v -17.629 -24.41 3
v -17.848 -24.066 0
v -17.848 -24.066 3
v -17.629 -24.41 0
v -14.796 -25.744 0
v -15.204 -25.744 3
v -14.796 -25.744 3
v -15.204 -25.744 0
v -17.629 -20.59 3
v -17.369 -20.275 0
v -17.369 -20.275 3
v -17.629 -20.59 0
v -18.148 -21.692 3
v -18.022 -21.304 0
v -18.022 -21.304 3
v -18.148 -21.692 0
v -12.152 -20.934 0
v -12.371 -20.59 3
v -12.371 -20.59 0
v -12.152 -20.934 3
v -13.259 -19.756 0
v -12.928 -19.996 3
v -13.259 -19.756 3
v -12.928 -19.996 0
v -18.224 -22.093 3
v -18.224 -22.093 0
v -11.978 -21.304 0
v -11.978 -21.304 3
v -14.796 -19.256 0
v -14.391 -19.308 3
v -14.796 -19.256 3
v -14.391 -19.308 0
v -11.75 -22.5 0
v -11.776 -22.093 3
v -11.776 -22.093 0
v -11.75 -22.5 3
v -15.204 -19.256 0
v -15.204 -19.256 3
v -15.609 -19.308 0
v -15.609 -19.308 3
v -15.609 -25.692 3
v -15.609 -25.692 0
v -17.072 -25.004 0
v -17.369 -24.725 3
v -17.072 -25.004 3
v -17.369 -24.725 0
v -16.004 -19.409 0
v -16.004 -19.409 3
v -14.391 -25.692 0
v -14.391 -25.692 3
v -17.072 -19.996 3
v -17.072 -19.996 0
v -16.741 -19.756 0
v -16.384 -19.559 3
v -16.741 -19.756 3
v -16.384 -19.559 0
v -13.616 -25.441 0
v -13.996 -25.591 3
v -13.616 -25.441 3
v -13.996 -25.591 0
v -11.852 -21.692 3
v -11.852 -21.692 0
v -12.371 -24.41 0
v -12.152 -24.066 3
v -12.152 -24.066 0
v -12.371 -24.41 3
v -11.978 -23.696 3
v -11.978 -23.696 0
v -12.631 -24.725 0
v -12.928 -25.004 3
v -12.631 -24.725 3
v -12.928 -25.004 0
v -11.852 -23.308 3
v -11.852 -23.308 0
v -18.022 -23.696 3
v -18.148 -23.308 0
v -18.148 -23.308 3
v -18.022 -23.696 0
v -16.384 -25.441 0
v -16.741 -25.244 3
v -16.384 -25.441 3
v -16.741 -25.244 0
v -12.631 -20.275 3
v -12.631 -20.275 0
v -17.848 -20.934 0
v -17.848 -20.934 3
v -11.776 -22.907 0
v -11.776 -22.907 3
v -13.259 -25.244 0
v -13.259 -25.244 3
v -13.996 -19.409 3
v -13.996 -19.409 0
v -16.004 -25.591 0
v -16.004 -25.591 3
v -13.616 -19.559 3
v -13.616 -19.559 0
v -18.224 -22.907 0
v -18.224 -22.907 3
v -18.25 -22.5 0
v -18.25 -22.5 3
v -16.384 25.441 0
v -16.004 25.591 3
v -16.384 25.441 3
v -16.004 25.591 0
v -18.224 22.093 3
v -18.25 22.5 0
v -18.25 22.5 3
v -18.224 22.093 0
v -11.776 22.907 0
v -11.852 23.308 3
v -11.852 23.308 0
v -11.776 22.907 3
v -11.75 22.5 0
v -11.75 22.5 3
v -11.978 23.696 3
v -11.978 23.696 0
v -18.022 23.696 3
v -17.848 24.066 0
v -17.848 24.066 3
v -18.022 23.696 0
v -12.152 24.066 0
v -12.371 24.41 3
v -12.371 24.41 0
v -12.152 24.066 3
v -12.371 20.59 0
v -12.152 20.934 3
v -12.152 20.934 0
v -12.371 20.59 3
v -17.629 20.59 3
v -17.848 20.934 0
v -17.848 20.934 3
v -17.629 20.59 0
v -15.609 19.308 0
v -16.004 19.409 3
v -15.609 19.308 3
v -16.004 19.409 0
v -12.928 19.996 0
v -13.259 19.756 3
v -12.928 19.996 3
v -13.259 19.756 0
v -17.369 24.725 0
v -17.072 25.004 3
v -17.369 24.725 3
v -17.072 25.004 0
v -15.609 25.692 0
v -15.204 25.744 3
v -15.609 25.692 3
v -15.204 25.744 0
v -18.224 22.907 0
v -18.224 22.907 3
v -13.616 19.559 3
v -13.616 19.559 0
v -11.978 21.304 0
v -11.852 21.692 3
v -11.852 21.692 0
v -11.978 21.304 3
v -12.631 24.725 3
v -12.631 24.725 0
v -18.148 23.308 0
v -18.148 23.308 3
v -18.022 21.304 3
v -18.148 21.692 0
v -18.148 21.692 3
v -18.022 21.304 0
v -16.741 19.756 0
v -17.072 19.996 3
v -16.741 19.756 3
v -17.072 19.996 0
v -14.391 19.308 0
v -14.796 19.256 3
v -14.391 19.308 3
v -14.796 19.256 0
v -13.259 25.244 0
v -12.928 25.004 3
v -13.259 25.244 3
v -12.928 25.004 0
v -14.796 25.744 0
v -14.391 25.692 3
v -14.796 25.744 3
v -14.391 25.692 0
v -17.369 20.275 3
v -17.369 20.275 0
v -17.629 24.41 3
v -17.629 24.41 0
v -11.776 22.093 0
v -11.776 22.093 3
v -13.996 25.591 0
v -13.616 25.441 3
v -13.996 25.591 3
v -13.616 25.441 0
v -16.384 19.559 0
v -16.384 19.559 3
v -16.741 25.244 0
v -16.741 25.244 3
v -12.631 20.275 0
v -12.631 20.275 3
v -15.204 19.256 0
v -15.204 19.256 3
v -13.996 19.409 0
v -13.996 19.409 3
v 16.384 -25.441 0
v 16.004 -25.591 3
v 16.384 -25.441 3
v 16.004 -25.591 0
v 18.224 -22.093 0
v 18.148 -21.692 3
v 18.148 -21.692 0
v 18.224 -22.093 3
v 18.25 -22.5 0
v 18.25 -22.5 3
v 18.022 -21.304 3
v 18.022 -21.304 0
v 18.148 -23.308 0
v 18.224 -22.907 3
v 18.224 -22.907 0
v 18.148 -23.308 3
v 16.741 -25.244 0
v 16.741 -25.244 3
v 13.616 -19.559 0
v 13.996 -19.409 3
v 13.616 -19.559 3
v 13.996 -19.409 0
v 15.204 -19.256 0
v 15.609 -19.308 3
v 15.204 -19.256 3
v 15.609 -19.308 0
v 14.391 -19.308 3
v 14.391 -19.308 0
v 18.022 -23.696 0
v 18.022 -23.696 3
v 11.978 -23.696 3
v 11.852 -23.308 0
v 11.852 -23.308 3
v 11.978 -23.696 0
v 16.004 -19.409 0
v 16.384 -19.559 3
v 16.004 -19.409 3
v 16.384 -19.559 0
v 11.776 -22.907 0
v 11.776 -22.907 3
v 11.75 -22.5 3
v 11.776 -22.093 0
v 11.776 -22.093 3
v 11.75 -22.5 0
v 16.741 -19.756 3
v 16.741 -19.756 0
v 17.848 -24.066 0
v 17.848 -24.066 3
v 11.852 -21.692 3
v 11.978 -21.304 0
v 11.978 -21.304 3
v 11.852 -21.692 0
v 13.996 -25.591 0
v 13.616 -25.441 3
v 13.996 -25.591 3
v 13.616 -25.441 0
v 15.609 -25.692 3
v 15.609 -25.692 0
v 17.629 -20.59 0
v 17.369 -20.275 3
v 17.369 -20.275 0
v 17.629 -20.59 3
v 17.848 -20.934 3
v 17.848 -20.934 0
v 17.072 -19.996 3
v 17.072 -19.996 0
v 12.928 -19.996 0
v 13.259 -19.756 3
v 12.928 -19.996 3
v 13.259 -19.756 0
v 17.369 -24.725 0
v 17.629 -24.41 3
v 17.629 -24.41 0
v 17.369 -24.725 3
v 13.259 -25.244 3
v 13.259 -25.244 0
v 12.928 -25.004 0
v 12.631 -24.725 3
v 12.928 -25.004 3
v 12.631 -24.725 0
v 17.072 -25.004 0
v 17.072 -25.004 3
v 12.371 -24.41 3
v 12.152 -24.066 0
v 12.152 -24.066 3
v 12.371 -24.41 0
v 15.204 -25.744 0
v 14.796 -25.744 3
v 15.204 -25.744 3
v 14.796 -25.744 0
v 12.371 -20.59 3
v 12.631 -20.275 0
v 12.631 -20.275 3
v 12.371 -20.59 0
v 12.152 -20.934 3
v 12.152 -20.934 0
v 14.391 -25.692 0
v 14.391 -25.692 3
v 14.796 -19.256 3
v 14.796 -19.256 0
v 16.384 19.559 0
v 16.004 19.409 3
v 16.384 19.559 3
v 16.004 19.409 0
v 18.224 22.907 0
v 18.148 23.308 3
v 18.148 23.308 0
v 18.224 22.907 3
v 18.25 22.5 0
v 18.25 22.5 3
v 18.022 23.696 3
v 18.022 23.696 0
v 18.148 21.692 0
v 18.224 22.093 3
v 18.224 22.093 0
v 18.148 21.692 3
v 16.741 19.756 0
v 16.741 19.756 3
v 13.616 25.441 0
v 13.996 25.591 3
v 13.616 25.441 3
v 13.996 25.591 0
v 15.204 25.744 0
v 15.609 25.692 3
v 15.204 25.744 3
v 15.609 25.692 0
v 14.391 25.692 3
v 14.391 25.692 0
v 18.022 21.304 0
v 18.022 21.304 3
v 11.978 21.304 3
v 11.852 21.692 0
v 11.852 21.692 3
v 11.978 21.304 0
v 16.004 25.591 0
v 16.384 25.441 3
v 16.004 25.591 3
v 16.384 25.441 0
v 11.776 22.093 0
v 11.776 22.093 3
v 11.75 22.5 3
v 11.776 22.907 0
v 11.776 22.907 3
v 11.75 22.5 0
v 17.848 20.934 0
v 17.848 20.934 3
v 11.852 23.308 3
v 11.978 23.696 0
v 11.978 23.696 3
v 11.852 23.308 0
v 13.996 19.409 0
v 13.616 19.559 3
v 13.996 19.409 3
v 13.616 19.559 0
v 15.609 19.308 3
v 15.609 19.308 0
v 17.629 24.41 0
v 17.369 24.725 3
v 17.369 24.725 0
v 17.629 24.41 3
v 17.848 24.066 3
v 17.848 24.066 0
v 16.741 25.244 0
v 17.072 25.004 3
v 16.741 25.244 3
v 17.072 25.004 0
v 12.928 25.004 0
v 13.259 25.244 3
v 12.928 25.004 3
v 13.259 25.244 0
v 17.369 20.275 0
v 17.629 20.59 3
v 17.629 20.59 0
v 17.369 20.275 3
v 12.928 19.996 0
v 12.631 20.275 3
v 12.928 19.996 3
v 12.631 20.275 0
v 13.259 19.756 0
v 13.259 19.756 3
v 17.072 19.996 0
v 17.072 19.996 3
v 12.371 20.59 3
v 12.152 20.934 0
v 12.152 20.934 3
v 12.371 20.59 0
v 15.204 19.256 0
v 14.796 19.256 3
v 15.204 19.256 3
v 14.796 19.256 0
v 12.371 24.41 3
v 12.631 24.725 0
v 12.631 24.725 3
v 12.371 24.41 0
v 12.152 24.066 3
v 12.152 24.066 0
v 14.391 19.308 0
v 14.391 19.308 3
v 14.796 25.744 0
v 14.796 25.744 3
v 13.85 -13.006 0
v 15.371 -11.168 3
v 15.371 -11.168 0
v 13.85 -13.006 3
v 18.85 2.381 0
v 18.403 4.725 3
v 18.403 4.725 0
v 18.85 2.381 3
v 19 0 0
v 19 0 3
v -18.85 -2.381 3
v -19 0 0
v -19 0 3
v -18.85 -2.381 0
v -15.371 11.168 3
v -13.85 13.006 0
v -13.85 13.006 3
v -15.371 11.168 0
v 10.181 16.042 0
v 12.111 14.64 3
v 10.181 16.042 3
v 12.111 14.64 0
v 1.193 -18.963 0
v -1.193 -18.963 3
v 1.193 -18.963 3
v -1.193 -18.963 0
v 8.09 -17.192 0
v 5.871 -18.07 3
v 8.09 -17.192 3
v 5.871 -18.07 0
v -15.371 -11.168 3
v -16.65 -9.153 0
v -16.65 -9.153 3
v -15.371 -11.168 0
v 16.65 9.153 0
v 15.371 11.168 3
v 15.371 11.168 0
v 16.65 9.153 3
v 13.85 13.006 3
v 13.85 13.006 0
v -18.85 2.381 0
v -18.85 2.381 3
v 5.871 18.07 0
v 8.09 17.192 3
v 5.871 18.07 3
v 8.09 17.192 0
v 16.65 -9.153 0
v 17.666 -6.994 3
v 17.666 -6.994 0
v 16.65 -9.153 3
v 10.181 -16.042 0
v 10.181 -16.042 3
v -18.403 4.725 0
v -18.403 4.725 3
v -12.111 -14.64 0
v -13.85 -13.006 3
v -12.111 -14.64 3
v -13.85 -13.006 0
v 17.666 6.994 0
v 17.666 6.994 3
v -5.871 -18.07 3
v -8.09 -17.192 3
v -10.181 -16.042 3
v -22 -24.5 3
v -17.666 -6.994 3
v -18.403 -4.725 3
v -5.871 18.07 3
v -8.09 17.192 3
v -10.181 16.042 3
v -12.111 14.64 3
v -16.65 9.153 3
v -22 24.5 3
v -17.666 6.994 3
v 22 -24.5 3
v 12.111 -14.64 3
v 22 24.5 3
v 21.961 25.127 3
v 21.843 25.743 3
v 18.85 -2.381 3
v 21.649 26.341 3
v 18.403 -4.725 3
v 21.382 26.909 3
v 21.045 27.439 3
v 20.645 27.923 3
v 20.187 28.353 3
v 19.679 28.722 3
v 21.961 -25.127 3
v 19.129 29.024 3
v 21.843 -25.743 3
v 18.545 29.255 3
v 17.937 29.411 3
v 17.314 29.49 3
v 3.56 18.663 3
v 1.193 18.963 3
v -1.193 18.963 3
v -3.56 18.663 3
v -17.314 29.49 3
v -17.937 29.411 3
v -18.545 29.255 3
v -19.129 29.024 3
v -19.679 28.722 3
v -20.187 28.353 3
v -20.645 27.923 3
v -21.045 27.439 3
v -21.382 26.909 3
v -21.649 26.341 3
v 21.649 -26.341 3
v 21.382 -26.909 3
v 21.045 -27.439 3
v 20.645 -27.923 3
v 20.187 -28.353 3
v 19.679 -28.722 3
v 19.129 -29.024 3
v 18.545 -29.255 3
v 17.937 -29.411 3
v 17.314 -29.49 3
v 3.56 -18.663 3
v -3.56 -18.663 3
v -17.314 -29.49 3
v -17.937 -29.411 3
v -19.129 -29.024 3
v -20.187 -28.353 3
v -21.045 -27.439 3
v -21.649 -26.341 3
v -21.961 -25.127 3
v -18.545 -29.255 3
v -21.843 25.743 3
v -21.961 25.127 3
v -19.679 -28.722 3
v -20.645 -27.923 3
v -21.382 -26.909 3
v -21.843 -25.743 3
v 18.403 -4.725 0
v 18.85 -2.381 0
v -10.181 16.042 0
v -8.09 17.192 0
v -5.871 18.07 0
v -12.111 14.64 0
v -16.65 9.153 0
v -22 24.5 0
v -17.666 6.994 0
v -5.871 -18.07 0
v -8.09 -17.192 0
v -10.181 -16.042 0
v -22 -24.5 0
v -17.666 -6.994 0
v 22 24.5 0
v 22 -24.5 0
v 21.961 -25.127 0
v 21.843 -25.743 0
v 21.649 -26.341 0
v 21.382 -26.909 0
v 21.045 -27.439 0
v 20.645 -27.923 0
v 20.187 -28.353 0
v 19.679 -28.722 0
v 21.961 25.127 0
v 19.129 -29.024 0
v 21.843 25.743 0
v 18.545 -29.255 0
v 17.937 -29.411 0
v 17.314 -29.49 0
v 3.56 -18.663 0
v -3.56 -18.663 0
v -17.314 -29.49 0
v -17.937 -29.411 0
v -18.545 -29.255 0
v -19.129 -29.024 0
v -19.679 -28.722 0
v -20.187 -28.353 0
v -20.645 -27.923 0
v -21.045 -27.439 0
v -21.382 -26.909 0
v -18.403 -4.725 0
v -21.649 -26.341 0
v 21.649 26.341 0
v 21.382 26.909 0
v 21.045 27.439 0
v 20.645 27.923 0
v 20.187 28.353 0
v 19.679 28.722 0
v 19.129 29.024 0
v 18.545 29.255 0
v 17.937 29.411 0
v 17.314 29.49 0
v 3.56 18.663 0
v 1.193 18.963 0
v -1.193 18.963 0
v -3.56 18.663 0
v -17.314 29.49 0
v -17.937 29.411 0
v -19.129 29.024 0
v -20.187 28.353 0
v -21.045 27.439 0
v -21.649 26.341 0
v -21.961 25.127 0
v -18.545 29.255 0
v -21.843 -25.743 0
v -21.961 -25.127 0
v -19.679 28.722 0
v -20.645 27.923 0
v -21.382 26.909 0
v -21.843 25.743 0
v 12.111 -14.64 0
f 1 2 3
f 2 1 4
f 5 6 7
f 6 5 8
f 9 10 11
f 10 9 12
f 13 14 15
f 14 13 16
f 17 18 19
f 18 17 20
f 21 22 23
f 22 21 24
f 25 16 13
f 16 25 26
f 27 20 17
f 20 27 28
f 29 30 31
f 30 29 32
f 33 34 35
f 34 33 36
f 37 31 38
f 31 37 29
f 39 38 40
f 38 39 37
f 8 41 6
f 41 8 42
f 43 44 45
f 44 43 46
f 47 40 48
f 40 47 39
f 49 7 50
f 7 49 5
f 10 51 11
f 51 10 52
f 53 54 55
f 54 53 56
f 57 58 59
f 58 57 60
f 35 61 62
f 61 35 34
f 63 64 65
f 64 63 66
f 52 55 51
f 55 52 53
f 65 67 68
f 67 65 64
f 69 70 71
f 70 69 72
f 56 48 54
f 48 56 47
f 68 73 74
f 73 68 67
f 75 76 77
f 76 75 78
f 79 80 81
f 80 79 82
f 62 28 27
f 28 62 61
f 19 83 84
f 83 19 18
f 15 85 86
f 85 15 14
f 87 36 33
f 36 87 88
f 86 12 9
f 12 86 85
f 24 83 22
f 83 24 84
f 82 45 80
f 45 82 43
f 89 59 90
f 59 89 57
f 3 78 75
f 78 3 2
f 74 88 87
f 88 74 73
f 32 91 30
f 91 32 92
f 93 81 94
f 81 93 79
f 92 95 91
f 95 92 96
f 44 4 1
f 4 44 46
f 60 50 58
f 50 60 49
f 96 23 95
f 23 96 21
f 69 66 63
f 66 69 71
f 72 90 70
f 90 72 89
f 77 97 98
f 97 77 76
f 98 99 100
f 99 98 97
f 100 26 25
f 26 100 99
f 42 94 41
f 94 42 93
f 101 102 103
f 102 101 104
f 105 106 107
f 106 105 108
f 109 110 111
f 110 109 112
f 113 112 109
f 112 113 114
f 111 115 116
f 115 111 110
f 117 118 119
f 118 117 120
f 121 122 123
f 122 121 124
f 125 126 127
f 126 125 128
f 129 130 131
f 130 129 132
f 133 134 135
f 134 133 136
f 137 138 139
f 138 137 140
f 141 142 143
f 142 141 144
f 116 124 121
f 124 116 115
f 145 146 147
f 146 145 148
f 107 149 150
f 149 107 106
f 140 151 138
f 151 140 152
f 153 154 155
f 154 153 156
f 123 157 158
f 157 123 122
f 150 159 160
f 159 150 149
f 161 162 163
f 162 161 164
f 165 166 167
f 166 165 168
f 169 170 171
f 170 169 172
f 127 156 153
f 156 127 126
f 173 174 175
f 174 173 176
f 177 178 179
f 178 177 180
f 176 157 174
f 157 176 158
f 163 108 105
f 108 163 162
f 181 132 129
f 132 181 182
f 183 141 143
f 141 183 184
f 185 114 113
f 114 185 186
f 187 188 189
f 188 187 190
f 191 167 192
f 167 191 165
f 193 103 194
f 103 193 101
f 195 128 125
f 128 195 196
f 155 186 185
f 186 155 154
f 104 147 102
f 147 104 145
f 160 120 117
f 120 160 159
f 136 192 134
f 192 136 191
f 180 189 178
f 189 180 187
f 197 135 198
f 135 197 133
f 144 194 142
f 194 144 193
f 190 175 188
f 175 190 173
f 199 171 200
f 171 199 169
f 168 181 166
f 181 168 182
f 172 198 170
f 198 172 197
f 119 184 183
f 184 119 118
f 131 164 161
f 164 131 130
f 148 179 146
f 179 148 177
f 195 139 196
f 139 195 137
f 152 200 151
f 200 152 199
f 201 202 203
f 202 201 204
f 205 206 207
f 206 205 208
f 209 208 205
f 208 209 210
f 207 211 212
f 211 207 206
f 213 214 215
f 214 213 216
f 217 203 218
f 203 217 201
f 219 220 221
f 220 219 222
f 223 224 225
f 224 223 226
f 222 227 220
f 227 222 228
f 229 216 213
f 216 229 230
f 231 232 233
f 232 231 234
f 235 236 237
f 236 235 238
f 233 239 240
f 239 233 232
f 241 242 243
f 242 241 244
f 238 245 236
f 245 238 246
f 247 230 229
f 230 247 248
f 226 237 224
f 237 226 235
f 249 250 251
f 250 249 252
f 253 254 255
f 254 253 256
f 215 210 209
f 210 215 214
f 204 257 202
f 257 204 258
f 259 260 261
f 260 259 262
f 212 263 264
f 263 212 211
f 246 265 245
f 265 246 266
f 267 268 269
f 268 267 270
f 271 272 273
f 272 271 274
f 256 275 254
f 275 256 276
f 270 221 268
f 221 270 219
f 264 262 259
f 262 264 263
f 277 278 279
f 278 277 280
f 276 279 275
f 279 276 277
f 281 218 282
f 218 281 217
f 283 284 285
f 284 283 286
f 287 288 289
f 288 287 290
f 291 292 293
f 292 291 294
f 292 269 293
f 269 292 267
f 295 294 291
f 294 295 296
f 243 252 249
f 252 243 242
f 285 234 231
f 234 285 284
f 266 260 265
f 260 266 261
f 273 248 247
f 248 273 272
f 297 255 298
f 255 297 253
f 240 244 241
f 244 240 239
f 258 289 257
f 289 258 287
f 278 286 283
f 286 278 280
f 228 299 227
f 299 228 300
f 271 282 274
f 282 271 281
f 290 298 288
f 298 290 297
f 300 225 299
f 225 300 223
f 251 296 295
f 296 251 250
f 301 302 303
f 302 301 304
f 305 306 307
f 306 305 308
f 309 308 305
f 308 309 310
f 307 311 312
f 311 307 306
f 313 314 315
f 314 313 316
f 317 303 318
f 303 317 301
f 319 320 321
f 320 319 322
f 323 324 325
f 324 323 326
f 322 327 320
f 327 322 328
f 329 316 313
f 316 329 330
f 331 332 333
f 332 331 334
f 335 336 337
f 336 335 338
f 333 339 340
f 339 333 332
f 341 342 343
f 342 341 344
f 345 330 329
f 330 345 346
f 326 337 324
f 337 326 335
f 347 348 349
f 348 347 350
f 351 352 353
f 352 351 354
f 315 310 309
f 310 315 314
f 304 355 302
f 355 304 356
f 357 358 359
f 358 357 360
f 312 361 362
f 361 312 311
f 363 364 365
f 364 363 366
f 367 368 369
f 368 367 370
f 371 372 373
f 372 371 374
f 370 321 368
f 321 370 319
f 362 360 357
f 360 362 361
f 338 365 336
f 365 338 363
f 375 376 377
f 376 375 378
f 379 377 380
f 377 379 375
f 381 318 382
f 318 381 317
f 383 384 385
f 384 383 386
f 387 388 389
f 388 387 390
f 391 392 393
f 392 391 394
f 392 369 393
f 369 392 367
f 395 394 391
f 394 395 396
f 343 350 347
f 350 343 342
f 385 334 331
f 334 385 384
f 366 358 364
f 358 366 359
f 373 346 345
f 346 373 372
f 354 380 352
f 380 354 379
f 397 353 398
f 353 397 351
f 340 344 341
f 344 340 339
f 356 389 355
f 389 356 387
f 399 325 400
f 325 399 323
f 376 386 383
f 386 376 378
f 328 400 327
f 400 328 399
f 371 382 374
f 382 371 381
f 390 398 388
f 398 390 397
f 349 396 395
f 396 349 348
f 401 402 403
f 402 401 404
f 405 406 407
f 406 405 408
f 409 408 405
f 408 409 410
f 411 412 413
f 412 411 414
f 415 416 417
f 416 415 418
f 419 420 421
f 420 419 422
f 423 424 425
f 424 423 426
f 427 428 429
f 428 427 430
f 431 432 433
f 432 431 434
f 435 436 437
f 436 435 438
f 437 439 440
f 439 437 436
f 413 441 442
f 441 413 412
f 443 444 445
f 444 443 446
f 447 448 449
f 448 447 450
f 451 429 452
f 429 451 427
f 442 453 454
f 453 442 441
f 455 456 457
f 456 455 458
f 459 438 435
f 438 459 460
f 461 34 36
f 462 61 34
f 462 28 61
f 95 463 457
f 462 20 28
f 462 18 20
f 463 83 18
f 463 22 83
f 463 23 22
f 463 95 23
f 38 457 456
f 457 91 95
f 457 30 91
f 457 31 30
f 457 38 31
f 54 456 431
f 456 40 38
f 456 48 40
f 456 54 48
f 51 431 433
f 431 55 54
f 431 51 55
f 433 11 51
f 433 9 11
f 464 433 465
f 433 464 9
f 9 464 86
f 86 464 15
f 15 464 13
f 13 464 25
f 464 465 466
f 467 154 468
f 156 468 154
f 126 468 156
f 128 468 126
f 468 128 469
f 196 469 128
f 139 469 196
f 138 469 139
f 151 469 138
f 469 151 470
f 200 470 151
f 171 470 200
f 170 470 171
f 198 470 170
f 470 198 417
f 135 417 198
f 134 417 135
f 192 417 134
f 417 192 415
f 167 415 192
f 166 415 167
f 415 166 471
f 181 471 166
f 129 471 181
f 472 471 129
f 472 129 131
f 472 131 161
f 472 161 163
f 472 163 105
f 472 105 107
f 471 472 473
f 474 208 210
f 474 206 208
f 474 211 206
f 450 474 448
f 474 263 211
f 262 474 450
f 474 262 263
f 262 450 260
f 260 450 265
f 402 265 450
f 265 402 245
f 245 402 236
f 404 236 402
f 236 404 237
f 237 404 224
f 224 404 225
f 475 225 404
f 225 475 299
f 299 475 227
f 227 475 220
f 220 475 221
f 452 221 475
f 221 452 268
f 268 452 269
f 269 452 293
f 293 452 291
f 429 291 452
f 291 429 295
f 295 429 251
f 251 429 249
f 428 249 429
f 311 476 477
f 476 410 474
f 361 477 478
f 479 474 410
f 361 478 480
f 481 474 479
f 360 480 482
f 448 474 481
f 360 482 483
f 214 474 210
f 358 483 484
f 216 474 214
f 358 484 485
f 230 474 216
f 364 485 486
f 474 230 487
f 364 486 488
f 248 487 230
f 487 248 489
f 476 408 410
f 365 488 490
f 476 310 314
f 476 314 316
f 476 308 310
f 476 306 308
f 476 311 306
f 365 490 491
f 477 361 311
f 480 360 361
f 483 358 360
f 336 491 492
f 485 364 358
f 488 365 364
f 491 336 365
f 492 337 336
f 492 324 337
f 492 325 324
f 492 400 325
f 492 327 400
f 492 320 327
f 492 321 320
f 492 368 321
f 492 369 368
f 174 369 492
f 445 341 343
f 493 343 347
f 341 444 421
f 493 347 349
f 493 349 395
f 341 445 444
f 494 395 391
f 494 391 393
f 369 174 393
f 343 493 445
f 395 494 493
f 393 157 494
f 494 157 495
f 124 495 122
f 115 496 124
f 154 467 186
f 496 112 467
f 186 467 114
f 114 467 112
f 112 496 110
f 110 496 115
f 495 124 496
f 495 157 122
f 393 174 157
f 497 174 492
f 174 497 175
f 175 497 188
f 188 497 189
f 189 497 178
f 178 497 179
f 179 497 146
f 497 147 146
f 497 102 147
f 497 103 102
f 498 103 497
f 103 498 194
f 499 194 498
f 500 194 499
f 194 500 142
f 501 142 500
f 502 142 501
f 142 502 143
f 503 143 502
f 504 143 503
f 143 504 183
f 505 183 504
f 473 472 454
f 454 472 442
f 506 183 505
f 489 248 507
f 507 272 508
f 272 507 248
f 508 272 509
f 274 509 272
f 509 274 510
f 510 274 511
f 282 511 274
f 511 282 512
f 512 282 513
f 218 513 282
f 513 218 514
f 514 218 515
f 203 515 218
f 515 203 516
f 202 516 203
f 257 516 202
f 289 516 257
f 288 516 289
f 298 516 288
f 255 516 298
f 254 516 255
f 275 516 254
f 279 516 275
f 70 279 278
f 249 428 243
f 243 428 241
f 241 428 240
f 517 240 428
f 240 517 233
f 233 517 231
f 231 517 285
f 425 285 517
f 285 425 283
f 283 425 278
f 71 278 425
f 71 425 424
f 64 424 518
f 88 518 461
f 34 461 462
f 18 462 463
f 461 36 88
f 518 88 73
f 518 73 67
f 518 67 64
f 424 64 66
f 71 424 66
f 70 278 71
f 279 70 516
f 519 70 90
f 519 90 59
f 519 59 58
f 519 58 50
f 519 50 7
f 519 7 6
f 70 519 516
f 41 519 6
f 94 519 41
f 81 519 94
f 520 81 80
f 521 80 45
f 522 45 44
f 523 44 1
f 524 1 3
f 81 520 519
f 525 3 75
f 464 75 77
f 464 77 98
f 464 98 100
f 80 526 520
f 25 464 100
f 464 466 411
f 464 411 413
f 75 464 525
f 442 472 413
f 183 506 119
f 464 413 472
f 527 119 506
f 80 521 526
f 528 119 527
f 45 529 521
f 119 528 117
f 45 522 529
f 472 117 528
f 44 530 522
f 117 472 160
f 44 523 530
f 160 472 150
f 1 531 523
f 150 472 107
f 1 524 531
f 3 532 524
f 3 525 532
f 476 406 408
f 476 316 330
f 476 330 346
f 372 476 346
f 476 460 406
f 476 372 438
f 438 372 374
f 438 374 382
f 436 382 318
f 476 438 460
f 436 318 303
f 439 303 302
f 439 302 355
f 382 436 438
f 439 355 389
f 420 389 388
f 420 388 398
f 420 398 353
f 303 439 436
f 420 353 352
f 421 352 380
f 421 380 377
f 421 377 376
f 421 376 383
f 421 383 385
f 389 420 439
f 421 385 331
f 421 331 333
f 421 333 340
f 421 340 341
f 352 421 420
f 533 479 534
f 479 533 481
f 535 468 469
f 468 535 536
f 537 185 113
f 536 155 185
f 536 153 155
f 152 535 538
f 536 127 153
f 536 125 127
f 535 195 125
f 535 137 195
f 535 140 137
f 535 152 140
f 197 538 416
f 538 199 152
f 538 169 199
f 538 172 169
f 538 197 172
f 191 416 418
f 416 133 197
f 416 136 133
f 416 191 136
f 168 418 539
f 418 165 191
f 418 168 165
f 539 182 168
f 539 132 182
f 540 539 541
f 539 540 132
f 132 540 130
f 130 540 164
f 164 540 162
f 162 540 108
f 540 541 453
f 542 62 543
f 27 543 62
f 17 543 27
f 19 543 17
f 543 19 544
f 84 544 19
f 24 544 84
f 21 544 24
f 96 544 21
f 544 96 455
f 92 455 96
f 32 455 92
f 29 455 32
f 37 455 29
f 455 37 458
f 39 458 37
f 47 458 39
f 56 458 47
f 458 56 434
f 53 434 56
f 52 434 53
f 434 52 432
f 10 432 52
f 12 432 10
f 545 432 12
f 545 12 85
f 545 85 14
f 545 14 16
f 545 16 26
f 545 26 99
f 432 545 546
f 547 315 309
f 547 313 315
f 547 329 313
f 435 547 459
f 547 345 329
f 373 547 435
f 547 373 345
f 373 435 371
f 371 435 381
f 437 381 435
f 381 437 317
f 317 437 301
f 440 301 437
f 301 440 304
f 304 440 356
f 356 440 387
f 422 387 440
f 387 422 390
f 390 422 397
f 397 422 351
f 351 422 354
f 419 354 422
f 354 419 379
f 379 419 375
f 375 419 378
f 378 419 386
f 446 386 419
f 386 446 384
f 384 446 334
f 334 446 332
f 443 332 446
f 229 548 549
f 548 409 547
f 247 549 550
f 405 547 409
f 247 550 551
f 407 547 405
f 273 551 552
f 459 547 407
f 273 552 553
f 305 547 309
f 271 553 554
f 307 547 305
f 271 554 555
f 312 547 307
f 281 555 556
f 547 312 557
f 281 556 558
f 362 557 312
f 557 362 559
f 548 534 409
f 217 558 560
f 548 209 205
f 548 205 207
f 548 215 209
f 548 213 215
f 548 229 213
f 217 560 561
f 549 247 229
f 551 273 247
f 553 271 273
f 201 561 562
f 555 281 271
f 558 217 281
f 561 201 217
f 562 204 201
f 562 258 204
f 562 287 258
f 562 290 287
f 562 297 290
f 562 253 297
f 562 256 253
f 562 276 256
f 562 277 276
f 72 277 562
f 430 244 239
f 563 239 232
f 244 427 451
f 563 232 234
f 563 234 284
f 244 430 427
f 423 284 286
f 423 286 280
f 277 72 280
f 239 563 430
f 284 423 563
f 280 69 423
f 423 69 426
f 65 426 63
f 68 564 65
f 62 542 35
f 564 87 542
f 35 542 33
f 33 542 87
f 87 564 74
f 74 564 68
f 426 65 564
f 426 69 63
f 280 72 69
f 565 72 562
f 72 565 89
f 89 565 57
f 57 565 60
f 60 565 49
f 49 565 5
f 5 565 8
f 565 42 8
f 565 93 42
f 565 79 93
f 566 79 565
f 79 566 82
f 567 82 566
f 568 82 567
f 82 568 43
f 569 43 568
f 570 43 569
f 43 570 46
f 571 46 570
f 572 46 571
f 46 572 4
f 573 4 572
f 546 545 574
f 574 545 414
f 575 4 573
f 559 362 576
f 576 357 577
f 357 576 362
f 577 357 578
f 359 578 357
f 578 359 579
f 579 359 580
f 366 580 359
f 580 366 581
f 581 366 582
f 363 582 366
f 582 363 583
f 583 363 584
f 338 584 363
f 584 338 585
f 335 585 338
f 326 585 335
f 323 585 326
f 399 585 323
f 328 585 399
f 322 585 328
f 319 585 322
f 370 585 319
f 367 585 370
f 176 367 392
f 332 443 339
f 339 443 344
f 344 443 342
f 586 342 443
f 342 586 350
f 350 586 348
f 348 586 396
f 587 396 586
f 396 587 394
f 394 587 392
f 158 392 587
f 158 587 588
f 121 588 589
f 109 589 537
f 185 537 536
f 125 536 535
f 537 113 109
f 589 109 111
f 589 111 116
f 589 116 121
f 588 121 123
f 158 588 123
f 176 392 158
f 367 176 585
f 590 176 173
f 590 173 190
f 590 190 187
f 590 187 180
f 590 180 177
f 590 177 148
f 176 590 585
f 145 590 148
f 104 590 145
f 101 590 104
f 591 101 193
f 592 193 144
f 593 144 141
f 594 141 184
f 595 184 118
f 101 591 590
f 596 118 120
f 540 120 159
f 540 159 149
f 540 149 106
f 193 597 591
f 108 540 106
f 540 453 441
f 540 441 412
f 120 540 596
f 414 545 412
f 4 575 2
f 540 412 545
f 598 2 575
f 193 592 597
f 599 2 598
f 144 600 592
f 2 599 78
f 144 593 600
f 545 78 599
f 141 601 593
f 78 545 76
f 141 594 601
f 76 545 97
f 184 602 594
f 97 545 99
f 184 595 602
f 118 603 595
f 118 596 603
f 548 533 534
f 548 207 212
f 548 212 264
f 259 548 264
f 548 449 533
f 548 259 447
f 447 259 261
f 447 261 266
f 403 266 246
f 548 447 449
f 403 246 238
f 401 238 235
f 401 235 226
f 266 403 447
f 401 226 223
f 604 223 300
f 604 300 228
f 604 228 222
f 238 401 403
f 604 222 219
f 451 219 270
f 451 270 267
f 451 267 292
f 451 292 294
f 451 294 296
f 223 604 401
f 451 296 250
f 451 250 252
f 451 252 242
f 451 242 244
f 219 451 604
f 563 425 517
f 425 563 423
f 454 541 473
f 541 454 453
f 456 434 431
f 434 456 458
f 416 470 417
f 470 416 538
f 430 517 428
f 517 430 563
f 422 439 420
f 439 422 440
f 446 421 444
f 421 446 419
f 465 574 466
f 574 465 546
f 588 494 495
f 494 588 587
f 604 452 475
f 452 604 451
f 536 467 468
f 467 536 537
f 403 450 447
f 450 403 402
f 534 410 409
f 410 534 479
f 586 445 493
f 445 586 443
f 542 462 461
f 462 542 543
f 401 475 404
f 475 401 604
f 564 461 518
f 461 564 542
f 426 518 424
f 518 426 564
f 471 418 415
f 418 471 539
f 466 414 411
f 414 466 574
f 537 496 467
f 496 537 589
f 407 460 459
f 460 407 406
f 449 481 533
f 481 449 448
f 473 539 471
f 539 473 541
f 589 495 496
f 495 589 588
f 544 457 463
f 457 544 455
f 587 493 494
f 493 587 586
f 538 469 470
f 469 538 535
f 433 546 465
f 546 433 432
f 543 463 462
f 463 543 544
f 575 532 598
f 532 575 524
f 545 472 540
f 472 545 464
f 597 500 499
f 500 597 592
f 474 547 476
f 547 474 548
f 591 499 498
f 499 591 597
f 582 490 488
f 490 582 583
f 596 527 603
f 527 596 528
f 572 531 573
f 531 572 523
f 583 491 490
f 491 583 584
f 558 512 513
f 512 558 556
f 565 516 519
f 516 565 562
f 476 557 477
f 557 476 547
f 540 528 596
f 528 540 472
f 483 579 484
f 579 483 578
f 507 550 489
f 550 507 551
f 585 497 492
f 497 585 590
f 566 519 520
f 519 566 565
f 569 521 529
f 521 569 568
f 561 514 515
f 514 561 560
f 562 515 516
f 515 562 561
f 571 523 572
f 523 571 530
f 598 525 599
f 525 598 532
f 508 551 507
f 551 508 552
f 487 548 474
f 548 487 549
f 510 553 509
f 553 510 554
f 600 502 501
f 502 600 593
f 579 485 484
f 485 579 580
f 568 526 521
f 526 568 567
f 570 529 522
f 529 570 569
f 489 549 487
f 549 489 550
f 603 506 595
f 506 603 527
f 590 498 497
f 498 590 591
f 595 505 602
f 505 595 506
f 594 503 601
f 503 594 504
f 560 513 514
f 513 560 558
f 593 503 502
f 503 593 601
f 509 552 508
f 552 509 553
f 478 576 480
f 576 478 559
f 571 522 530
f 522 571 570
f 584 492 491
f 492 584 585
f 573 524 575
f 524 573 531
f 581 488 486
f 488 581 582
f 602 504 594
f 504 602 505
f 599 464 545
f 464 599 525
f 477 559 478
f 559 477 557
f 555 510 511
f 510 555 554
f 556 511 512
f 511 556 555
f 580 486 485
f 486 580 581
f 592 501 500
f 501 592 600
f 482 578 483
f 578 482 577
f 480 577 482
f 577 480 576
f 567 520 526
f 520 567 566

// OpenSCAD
$fn = 50;


difference() {
	union() {
		hull() {
			translate(v = [-17.0000000000, 24.5000000000, 0]) {
				cylinder(h = 3, r = 5);
			}
			translate(v = [17.0000000000, 24.5000000000, 0]) {
				cylinder(h = 3, r = 5);
			}
			translate(v = [-17.0000000000, -24.5000000000, 0]) {
				cylinder(h = 3, r = 5);
			}
			translate(v = [17.0000000000, -24.5000000000, 0]) {
				cylinder(h = 3, r = 5);
			}
		}
	}
	union() {
		#translate(v = [-15.0000000000, -22.5000000000, -100.0000000000]) {
			cylinder(h = 200, r = 3.2500000000);
		}
		#translate(v = [-15.0000000000, 22.5000000000, -100.0000000000]) {
			cylinder(h = 200, r = 3.2500000000);
		}
		#translate(v = [15.0000000000, -22.5000000000, -100.0000000000]) {
			cylinder(h = 200, r = 3.2500000000);
		}
		#translate(v = [15.0000000000, 22.5000000000, -100.0000000000]) {
			cylinder(h = 200, r = 3.2500000000);
		}
		#cylinder(h = 3, r = 19.0000000000);
	}
}
